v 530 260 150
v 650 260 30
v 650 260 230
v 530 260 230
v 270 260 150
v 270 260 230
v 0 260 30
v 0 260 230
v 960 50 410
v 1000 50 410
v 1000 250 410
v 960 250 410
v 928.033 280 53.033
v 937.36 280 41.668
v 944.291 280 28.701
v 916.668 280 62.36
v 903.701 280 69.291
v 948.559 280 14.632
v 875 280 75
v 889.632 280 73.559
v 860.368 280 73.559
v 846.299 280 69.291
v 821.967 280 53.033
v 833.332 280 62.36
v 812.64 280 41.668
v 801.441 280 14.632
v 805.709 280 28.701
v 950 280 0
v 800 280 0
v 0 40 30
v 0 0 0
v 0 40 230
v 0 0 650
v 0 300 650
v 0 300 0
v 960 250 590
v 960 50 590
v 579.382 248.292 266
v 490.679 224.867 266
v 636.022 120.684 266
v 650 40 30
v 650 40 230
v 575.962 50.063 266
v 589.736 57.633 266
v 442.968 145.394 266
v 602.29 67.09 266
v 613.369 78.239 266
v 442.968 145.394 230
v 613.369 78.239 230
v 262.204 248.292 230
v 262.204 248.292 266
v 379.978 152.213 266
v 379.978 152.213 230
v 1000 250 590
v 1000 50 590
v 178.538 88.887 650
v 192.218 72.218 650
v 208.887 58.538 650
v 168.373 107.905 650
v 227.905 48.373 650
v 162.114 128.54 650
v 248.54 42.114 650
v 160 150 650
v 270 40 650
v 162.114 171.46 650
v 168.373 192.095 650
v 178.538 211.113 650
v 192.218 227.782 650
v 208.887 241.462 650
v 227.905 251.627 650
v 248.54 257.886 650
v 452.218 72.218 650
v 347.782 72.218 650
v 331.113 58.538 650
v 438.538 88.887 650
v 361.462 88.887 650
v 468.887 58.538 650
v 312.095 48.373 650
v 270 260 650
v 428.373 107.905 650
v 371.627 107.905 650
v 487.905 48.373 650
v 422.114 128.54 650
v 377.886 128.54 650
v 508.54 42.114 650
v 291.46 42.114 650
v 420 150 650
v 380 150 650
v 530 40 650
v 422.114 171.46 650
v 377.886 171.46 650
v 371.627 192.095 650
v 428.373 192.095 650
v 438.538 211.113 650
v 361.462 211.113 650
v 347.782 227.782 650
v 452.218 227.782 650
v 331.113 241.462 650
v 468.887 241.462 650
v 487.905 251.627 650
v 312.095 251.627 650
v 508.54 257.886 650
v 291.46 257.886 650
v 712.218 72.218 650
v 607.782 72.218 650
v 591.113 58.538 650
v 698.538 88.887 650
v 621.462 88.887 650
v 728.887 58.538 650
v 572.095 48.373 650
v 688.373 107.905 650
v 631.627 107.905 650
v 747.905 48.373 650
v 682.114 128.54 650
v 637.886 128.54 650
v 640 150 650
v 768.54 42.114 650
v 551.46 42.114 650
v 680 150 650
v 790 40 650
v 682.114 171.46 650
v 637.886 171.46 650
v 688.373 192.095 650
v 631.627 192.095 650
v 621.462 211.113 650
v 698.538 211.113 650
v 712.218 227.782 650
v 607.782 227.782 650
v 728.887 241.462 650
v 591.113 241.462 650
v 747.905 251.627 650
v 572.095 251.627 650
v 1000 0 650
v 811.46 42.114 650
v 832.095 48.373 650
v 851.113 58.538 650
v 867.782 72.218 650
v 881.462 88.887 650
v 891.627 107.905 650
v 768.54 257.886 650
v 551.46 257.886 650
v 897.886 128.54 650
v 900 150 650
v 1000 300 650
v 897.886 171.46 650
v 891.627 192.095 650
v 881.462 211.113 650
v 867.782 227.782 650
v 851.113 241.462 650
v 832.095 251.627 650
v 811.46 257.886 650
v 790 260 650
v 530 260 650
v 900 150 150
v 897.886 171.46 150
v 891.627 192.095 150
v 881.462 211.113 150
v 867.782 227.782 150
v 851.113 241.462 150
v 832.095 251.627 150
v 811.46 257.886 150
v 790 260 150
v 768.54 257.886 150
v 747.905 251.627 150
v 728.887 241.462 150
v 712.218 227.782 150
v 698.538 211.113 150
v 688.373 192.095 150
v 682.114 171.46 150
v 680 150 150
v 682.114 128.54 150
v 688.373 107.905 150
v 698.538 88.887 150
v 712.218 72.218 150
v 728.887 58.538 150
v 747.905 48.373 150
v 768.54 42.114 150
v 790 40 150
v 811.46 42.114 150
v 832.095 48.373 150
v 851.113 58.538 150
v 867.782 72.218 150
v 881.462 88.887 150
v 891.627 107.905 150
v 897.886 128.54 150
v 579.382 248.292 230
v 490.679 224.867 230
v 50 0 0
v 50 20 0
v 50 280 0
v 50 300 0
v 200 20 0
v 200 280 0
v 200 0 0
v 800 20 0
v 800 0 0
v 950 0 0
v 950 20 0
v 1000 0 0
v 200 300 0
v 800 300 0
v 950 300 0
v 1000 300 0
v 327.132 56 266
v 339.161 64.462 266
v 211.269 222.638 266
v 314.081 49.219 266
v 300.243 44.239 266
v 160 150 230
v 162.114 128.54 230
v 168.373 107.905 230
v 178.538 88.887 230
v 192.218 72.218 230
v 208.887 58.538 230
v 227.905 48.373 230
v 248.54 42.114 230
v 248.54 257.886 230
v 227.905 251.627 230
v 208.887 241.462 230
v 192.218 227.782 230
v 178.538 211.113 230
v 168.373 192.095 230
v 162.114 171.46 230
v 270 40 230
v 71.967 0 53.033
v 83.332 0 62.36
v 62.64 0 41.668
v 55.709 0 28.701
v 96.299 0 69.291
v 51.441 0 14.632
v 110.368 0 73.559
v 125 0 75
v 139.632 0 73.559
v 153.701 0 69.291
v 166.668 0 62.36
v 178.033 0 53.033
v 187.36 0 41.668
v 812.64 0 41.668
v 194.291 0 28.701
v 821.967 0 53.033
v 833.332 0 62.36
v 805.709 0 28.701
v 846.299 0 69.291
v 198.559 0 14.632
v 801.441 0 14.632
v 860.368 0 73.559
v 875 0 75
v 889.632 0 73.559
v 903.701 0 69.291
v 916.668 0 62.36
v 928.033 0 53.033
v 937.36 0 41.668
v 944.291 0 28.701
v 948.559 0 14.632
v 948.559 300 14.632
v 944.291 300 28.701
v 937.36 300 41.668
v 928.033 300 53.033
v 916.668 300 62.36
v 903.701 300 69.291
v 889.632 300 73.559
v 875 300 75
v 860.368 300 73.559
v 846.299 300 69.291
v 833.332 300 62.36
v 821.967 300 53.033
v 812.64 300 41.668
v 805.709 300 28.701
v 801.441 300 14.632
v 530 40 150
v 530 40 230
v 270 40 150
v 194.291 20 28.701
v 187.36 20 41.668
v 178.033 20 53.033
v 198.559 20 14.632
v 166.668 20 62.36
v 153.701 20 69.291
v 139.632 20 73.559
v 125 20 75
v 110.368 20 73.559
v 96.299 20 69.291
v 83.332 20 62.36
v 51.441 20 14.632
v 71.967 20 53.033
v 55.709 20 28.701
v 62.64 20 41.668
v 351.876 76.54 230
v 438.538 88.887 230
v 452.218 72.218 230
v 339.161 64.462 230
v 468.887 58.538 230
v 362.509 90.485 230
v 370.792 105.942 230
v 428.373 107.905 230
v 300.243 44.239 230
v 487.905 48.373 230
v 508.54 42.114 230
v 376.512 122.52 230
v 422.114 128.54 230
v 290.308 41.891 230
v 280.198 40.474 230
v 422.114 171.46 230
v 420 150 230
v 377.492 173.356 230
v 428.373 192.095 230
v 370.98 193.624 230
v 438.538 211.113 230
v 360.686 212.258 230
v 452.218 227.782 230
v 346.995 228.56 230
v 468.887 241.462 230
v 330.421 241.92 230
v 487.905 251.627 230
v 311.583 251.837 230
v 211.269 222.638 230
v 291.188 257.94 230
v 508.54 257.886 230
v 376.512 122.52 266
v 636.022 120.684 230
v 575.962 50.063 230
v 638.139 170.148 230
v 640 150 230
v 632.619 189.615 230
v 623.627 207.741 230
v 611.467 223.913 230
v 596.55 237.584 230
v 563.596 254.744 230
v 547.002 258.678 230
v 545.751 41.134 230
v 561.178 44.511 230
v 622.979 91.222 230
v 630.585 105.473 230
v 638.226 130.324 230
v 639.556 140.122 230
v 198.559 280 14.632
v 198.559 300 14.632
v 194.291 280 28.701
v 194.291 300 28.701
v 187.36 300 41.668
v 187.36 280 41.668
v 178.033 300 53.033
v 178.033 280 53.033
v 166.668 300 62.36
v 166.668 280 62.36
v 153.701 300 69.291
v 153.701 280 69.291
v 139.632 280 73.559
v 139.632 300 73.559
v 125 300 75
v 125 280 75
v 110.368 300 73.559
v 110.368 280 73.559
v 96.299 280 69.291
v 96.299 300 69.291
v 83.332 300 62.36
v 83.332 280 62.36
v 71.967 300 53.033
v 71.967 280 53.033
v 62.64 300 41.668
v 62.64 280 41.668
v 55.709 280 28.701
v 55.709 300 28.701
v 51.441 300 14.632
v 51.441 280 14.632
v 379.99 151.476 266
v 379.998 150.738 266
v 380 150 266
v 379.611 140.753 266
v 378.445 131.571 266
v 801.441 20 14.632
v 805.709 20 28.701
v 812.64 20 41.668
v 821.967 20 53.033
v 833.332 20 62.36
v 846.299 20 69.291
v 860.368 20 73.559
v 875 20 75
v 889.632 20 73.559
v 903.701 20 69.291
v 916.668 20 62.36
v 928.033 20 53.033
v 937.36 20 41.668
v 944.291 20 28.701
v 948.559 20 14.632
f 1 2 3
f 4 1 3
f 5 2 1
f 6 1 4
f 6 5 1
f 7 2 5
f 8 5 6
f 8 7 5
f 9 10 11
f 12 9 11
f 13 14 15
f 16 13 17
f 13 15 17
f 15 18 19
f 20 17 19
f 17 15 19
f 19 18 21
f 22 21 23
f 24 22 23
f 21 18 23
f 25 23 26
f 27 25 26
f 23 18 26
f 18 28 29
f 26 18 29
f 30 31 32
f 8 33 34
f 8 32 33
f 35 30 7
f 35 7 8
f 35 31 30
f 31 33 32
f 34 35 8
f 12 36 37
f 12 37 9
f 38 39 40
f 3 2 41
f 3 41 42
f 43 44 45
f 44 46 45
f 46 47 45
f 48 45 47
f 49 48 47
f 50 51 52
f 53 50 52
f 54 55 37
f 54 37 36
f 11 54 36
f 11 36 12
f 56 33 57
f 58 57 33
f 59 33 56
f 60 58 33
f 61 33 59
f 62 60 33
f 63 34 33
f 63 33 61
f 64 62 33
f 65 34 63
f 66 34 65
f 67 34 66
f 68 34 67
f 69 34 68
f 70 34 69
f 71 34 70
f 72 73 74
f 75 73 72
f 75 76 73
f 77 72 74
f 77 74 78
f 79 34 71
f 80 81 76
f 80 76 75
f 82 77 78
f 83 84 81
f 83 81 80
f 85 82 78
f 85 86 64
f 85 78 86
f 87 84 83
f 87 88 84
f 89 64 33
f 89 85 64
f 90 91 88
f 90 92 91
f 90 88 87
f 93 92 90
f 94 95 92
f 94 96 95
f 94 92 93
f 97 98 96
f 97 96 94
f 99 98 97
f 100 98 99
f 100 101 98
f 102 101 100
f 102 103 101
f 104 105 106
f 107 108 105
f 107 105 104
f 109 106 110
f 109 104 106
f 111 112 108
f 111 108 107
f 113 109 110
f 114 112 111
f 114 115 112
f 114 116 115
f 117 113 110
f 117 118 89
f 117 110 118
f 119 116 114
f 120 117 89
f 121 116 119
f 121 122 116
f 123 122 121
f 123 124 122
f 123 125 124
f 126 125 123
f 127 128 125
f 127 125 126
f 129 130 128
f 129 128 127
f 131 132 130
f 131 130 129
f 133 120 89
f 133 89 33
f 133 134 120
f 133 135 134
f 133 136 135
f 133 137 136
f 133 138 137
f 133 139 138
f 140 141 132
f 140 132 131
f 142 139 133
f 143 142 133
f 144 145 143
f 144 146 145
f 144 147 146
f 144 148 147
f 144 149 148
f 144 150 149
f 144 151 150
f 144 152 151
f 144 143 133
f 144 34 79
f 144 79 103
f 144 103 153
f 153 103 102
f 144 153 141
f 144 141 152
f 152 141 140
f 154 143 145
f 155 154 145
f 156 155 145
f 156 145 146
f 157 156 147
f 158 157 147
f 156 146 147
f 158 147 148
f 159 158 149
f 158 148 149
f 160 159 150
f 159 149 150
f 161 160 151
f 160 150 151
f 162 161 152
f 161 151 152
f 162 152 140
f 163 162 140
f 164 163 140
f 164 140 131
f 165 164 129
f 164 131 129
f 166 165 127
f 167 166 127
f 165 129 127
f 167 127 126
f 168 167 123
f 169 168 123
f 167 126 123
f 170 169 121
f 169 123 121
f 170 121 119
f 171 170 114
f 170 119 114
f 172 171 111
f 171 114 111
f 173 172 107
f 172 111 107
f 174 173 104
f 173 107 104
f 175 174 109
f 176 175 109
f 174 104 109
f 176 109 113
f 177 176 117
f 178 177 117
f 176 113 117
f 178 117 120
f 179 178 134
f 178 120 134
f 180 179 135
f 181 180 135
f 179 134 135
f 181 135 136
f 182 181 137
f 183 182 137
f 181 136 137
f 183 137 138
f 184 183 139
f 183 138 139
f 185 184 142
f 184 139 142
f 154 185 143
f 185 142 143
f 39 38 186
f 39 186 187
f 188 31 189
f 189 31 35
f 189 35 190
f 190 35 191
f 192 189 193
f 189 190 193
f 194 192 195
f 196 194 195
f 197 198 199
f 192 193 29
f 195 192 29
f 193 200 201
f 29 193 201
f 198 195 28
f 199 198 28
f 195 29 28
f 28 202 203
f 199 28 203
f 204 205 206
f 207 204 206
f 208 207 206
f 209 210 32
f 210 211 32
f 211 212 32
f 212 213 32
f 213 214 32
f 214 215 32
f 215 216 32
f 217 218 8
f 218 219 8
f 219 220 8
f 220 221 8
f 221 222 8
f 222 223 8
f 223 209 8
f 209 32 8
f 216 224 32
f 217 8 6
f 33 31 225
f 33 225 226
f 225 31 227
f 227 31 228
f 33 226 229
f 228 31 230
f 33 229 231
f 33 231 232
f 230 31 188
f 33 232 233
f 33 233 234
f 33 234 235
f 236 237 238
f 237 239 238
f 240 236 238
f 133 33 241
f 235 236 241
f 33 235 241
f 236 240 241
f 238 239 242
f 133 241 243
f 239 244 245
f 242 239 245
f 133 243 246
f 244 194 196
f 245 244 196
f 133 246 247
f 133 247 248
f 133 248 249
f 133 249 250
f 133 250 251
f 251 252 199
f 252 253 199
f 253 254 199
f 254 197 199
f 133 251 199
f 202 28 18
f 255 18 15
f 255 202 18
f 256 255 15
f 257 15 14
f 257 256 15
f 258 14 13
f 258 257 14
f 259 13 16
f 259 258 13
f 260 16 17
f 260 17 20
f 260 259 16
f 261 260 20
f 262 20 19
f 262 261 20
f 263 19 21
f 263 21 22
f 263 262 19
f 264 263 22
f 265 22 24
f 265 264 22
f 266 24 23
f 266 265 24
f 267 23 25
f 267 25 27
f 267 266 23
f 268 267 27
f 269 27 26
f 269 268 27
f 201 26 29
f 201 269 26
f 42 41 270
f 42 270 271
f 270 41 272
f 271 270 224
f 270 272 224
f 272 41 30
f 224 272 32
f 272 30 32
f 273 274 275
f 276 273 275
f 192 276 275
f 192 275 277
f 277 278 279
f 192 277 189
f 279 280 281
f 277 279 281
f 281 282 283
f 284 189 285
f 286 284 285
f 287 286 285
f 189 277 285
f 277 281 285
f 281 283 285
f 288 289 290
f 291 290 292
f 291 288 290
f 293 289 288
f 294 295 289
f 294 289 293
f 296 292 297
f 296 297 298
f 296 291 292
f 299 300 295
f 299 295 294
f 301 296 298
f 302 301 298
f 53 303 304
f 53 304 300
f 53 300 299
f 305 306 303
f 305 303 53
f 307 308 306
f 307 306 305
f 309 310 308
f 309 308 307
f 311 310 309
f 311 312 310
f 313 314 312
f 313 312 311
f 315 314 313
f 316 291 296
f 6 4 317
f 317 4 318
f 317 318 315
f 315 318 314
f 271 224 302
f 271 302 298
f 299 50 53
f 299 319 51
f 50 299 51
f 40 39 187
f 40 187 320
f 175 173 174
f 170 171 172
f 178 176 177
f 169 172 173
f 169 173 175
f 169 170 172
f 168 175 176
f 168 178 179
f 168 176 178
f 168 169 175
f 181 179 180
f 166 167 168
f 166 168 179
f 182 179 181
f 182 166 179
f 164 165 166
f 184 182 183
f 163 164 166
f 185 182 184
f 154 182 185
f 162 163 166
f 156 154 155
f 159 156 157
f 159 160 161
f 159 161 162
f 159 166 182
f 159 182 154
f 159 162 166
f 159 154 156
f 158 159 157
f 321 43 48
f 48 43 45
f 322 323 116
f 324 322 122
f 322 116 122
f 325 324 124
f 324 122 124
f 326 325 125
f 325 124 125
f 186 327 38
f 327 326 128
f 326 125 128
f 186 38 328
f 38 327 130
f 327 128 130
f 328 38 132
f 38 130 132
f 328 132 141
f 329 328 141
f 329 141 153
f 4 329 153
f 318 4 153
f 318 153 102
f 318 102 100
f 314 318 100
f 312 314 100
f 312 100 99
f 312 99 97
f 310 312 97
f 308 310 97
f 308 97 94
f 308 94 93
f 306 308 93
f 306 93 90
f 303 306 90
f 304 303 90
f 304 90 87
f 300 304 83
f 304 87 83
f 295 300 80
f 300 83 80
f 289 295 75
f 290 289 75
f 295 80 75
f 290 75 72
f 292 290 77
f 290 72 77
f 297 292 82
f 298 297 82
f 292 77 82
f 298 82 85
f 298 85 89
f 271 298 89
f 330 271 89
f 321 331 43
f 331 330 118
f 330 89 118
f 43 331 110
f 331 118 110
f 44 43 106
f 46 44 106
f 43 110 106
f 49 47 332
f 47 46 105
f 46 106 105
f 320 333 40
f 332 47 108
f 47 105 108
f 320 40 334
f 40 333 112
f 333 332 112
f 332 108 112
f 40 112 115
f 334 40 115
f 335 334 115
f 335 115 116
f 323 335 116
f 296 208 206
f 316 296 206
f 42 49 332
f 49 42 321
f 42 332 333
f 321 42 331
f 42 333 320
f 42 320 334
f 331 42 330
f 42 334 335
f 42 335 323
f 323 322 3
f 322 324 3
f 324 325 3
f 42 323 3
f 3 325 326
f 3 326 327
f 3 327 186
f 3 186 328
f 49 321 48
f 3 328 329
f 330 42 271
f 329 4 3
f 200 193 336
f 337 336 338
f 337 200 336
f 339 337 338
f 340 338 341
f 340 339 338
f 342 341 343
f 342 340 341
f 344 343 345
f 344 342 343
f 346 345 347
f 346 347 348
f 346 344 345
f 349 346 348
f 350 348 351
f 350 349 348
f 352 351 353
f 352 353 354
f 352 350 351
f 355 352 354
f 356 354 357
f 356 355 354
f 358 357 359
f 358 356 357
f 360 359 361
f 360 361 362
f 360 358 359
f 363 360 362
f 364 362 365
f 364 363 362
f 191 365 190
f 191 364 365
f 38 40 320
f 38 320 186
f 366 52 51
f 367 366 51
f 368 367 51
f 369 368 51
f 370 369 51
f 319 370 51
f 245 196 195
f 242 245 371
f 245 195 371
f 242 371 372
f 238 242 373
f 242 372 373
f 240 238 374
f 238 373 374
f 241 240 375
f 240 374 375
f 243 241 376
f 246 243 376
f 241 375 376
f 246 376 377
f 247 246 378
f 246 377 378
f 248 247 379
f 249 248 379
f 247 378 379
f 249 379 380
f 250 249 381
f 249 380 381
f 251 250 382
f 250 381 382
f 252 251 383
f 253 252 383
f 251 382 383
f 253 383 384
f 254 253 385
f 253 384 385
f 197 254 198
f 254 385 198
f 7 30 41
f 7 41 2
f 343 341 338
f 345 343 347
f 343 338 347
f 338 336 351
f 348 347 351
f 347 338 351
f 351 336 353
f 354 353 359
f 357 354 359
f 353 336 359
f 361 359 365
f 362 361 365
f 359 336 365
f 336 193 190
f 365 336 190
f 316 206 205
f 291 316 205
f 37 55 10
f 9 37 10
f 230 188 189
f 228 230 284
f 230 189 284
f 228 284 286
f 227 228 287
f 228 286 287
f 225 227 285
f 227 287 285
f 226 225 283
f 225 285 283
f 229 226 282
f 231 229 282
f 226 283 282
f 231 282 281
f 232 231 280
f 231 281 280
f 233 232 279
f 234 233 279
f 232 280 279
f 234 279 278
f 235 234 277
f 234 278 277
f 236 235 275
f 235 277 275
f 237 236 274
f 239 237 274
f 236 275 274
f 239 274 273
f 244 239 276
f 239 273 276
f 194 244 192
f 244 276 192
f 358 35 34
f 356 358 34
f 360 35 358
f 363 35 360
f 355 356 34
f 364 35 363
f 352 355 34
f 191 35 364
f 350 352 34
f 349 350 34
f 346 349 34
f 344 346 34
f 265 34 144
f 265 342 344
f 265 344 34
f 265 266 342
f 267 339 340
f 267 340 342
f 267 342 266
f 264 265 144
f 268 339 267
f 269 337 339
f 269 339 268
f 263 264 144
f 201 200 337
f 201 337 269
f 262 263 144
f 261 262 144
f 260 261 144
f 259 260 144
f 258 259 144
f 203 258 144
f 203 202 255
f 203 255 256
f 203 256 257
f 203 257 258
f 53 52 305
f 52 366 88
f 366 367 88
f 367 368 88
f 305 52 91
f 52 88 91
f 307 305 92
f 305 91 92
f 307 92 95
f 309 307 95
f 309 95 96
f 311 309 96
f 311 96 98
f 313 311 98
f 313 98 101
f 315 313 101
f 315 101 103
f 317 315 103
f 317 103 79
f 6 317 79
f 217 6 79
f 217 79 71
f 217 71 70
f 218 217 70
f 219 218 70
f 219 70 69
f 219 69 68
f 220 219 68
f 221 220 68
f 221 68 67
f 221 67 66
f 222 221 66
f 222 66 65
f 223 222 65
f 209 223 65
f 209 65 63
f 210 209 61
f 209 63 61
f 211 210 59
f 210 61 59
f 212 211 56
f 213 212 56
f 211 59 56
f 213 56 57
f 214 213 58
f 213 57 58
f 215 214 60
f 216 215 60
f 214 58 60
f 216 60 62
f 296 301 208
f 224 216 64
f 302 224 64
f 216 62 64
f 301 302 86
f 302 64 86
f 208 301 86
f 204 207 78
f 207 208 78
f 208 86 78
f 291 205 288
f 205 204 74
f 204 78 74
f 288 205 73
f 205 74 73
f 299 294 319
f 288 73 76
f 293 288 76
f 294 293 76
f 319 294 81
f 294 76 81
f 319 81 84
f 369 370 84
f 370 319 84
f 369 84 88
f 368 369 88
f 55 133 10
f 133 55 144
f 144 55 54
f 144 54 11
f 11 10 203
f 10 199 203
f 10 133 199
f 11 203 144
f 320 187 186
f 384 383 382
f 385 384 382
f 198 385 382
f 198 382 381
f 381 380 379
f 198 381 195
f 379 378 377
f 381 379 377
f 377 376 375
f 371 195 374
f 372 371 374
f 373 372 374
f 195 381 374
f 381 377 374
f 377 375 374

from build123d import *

# Parameters (mm, degrees)
SKETCH3_W           = 1000
SKETCH3_H           = 300
BOSS_EXTRUDE2_DEPTH = 650
SKETCH4_W           = 180
SKETCH4_H           = 200
CUT_EXTRUDE2_DEPTH  = 40
SKETCH5_W           = 200
SKETCH5_H           = 220
CUT_EXTRUDE3_DEPTH  = 650
SKETCH9_R           = 110
CUT_EXTRUDE4_DEPTH  = 500
CUT_EXTRUDE6_DEPTH  = 20
CUT_EXTRUDE7_START  = -20
CUT_EXTRUDE7_DEPTH  = 20
BOSS_EXTRUDE5_START = -36
BOSS_EXTRUDE5_DEPTH = 36


with BuildPart() as part:
    # Sketch3 → Boss-Extrude2 (new body)
    with BuildSketch(Plane.XY):
        with Locations((500, 150)):
            Rectangle(SKETCH3_W, SKETCH3_H)
    extrude(amount=BOSS_EXTRUDE2_DEPTH)

    # Sketch4 → Cut-Extrude2 (cut)
    with BuildSketch(Plane(origin=(1000, 0, 0), x_dir=(0, 0, -1), z_dir=(1, 0, 0))):
        with Locations((-500, 150)):
            Rectangle(SKETCH4_W, SKETCH4_H)
    extrude(amount=-CUT_EXTRUDE2_DEPTH, mode=Mode.SUBTRACT)

    # Sketch5 → Cut-Extrude3 (cut)
    with BuildSketch(Plane.ZY):
        with Locations((130, 150)):
            Rectangle(SKETCH5_W, SKETCH5_H)
    extrude(amount=-CUT_EXTRUDE3_DEPTH, mode=Mode.SUBTRACT)

    # Sketch9 → Cut-Extrude4 (cut)
    with BuildSketch(Plane.XY.offset(650)):
        with Locations((270, 150)):
            Circle(SKETCH9_R)
        with Locations((530, 150)):
            Circle(SKETCH9_R)
        with Locations((790, 150)):
            Circle(SKETCH9_R)
    extrude(amount=-CUT_EXTRUDE4_DEPTH, mode=Mode.SUBTRACT)

    # Sketch16 → Cut-Extrude6 (cut)
    with BuildSketch(Plane(origin=(0, 300, 0), x_dir=(1, 0, 0), z_dir=(0, 1, 0))):
        with BuildLine():
            Line((50, 0), (200, 0))
            ThreePointArc((200, 0), (125, -75), (50, 0))
        make_face()
        with BuildLine():
            Line((800, 0), (950, 0))
            ThreePointArc((950, 0), (875, -75), (800, 0))
        make_face()
    extrude(amount=-CUT_EXTRUDE6_DEPTH, mode=Mode.SUBTRACT)

    # Sketch17 → Cut-Extrude7 (cut)
    with BuildSketch(Plane.XZ.offset(CUT_EXTRUDE7_START)):
        with BuildLine():
            Line((950, 0), (800, 0))
            ThreePointArc((800, 0), (875, 75), (950, 0))
        make_face()
        with BuildLine():
            Line((200, 0), (50, 0))
            ThreePointArc((50, 0), (125, 75), (200, 0))
        make_face()
    extrude(amount=CUT_EXTRUDE7_DEPTH, mode=Mode.SUBTRACT)

    # Sketch20 → Boss-Extrude5 (add)
    with BuildSketch(Plane(origin=(0, 0, 230), x_dir=(-1, 0, 0), z_dir=(0, 0, -1)).offset(BOSS_EXTRUDE5_START)):
        with BuildLine():
            Line((-262.20422396, 248.292446323), (-379.977728565, 152.213418103))
            ThreePointArc((-379.977728565, 152.213418103), (-379.258383778, 137.248310924), (-376.512143463, 122.519765376))
            Line((-376.512143463, 122.519765376), (-262.20422396, 248.292446323))
        make_face()
        with BuildLine():
            Line((-211.268579762, 222.638299571), (-339.161275259, 64.462183775))
            ThreePointArc((-339.161275259, 64.462183775), (-320.720059896, 52.39121185), (-300.242552389, 44.239005181))
            Line((-300.242552389, 44.239005181), (-211.268579762, 222.638299571))
        make_face()
        Polygon((-636.02165018, 120.684309778), (-579.382132355, 248.292446323), (-490.67938588, 224.867424015), align=None)
        Polygon((-442.968214146, 145.394183969), (-625.077752353, 73.624220022), (-590, 40), align=None)
    extrude(amount=BOSS_EXTRUDE5_DEPTH)


with BuildPart() as boss_extrude5_piece_1:
    # of the separate pieces the step leaves, piece 1, a body of its own (boss_extrude5_pieces)
    add(part.part.solids().sort_by_distance((0, 300, 0))[0])


with BuildPart() as boss_extrude5_piece_2:
    # of the separate pieces the step leaves, piece 2, a body of its own (boss_extrude5_pieces)
    add(part.part.solids().sort_by_distance((490.67938588, 224.867424015, 230))[0])


solid = Compound([boss_extrude5_piece_1.part, boss_extrude5_piece_2.part])
